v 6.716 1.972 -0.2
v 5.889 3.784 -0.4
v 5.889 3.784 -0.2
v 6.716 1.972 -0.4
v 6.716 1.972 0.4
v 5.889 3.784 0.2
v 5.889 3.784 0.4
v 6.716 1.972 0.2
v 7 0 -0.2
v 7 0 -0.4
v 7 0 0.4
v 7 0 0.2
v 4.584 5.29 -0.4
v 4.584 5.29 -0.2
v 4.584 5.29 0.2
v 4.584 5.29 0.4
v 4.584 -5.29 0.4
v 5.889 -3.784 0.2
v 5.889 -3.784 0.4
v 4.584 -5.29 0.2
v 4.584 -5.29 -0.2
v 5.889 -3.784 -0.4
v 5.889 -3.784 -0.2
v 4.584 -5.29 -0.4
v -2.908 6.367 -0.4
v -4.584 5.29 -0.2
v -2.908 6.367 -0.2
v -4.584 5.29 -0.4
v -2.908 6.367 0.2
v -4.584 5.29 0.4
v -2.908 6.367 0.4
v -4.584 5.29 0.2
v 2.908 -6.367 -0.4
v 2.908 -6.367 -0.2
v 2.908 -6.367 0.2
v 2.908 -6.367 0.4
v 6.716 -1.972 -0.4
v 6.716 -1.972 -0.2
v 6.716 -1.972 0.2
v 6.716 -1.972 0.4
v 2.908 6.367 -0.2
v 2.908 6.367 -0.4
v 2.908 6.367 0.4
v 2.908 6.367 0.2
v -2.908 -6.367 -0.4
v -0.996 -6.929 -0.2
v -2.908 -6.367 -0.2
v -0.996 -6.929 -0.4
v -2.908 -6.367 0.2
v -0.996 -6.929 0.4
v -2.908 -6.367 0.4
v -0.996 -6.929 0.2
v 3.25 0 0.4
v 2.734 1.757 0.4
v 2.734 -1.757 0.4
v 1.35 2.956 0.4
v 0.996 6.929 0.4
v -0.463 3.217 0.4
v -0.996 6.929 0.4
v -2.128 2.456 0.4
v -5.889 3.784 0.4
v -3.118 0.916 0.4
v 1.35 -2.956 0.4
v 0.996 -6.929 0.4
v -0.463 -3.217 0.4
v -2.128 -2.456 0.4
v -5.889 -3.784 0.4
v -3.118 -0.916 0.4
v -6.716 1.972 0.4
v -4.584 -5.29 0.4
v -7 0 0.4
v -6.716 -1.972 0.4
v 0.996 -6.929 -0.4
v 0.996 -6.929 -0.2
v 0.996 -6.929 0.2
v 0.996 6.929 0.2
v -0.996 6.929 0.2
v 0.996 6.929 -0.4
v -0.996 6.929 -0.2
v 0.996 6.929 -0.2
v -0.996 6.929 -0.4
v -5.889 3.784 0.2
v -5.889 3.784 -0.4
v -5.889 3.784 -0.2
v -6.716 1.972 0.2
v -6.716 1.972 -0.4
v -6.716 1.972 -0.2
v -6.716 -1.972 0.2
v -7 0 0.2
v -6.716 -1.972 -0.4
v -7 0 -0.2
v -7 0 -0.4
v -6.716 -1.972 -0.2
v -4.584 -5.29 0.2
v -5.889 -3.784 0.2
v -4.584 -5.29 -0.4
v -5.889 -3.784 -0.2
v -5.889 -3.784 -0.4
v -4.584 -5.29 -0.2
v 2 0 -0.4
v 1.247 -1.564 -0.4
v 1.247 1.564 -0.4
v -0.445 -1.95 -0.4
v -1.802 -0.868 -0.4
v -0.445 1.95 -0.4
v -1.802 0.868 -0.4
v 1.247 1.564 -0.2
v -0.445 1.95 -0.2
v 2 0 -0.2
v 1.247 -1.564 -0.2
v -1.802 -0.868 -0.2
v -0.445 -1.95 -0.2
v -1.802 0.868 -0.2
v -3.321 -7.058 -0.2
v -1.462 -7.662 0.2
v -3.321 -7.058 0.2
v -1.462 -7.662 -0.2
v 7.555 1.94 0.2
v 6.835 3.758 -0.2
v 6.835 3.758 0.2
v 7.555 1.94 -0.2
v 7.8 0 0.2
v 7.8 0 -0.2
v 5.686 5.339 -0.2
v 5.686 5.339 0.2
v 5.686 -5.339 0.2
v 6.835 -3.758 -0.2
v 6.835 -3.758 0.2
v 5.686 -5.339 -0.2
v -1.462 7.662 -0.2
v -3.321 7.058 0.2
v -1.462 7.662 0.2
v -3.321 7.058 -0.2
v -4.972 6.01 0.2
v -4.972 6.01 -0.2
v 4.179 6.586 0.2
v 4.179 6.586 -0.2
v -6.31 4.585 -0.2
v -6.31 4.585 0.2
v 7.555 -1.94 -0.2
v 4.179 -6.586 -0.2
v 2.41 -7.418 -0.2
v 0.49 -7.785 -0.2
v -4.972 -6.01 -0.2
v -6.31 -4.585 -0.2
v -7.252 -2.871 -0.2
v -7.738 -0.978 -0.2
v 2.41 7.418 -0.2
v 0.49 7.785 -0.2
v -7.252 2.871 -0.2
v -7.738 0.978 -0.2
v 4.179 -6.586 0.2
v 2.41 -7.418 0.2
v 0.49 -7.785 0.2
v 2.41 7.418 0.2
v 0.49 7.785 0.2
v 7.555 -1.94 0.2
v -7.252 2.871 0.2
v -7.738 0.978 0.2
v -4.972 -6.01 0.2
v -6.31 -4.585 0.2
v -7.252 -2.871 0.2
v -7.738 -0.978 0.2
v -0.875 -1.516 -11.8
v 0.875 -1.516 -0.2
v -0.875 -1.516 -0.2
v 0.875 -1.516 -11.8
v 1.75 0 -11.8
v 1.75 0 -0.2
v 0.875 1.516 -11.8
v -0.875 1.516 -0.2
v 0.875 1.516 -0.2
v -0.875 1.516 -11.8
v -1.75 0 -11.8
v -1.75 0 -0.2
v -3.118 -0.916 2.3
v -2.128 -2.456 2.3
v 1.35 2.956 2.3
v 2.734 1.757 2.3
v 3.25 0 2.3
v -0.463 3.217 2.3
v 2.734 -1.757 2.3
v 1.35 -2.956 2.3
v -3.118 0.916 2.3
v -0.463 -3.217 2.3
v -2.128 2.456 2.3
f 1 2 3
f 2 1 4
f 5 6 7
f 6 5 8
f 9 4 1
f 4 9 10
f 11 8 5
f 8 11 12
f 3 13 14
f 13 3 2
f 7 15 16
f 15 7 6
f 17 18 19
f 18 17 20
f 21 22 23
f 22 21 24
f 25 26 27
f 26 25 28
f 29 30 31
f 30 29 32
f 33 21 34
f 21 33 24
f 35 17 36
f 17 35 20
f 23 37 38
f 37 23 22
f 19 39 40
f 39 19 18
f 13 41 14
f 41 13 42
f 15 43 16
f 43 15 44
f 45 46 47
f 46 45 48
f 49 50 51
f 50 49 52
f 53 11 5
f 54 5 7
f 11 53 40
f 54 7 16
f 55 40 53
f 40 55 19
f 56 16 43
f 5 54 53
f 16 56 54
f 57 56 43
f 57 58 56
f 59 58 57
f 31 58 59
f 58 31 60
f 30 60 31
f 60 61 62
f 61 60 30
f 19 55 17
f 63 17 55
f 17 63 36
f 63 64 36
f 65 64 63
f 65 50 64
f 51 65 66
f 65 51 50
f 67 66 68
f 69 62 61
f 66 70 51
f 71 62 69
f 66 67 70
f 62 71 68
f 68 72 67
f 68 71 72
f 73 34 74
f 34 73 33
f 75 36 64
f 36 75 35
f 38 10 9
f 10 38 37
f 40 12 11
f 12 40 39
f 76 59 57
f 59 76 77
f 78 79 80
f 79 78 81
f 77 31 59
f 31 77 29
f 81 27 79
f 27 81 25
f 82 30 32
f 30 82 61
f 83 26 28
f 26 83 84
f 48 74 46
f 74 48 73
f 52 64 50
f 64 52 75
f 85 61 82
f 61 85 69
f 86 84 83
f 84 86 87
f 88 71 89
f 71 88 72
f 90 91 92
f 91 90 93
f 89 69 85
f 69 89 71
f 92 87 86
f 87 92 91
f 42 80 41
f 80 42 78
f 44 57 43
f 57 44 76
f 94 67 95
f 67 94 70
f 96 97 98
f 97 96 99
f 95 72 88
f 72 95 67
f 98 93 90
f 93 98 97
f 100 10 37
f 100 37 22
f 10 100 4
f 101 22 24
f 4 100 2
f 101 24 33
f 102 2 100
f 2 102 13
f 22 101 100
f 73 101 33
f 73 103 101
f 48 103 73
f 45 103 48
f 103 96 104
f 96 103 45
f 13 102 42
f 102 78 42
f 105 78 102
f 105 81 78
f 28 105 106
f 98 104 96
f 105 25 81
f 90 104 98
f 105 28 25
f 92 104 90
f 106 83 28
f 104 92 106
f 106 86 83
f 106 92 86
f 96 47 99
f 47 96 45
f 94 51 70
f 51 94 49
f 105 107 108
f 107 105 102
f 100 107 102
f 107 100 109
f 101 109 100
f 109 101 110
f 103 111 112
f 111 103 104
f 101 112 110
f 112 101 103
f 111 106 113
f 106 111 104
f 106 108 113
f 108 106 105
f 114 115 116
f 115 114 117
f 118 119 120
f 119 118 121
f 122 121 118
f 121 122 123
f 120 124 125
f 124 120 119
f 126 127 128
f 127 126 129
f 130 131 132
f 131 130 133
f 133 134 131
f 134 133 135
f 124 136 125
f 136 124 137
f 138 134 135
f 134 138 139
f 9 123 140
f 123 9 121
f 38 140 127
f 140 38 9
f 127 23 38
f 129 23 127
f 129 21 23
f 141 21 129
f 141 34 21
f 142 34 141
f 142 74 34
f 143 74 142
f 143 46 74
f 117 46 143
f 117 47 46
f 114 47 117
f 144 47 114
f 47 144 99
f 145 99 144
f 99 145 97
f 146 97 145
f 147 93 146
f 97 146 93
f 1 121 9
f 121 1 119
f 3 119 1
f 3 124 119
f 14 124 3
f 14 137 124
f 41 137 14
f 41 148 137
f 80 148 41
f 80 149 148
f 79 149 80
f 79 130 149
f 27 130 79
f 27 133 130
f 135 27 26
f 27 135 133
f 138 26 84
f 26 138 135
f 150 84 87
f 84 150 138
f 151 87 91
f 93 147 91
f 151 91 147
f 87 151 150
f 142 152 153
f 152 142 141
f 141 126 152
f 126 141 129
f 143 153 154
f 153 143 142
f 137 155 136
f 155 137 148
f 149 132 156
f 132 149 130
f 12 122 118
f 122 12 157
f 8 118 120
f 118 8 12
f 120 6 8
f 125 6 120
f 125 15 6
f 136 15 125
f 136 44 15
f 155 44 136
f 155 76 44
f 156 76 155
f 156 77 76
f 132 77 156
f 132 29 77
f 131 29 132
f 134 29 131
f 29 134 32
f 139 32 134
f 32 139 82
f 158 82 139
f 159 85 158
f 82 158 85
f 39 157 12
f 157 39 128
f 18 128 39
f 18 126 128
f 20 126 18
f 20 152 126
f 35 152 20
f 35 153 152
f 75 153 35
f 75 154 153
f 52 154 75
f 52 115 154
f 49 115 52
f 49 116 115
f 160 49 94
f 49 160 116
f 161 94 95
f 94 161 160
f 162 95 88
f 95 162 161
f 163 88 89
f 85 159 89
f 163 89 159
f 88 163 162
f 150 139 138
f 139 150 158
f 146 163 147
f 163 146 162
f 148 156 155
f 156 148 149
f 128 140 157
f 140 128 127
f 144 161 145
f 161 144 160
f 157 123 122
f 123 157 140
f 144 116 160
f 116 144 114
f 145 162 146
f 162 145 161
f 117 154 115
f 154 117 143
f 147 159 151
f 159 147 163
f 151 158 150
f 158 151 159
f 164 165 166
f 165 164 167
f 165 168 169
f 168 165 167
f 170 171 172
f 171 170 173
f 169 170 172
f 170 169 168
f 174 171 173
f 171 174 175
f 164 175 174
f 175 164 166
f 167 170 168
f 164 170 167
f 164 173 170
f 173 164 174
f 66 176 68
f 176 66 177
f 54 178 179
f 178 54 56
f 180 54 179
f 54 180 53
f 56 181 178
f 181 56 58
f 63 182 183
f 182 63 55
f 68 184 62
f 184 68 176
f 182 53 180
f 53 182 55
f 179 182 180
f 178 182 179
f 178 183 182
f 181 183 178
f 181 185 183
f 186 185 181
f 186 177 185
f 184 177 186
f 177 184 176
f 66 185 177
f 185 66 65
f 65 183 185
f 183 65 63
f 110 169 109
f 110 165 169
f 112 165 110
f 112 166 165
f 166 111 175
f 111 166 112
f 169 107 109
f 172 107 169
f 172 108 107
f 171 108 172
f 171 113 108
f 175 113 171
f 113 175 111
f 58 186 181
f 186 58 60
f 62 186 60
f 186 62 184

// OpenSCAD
// Parameters
inner_diameter_mm = 4.0; //[2.0:8.0:0.1]
outer_diameter_mm = 14.0; //[7.0:28.0:0.1]
thickness_mm = 0.8; //[0.4:1.6:0.05]
eps_mm = 0.2; //[0.05:0.5:0.05]
grommet_lip_thickness_mm = 0.4; //[0.2:1.0:0.05]
grommet_lip_radial_mm = 0.8; //[0.4:2.0:0.1]
screw_shank_diameter_mm = 3.5; //[2.0:6.0:0.1]
screw_length_mm = 12.0; //[6.0:30.0:1]
screw_head_diameter_mm = 6.5; //[4.0:12.0:0.1]
screw_head_height_mm = 2.5; //[1.5:6.0:0.1]
connect_overlap_mm = 0.6; //[0.2:2.0:0.1]

// Penny Washer - complete geometry
module penny_washer() {
  color("Silver") {
    difference() {
      // Washer body
      cylinder(r=outer_diameter_mm/2, h=thickness_mm, center=true);
      // Center through-hole
      translate([0, 0, 0])
        cylinder(r=inner_diameter_mm/2, h=thickness_mm + 2*eps_mm, center=true);
    }
  }
}

// Round Grommet Top - complete geometry
module round_grommet_top() {
  color("DimGray") {
    difference() {
      // Grommet top outer
      translate([0, 0, thickness_mm/2 + grommet_lip_thickness_mm/2 - connect_overlap_mm])
        cylinder(r=outer_diameter_mm/2 + grommet_lip_radial_mm, h=grommet_lip_thickness_mm, center=true);
      // Grommet top inner hole
      translate([0, 0, thickness_mm/2 + grommet_lip_thickness_mm/2 - connect_overlap_mm])
        cylinder(r=inner_diameter_mm/2, h=grommet_lip_thickness_mm + 2*eps_mm, center=true);
    }
  }
}

// Screw And Washer - complete geometry
module screw_and_washer() {
  color("Black") {
    union() {
      // Screw shank
      translate([0, 0, -(thickness_mm/2 + screw_length_mm/2 - connect_overlap_mm)])
        cylinder(r=screw_shank_diameter_mm/2, h=screw_length_mm, center=true);
      // Screw head
      translate([0, 0, thickness_mm/2 + screw_head_height_mm/2 - connect_overlap_mm])
        cylinder(r=screw_head_diameter_mm/2, h=screw_head_height_mm, center=true);
    }
  }
}

// Round Grommet Assembly - complete geometry
module round_grommet_assembly() {
  union() {
    penny_washer();
    round_grommet_top();
  }
}

// Assembly - combines all parts
module assembly() {
  round_grommet_assembly();
  screw_and_washer();
}

assembly();
